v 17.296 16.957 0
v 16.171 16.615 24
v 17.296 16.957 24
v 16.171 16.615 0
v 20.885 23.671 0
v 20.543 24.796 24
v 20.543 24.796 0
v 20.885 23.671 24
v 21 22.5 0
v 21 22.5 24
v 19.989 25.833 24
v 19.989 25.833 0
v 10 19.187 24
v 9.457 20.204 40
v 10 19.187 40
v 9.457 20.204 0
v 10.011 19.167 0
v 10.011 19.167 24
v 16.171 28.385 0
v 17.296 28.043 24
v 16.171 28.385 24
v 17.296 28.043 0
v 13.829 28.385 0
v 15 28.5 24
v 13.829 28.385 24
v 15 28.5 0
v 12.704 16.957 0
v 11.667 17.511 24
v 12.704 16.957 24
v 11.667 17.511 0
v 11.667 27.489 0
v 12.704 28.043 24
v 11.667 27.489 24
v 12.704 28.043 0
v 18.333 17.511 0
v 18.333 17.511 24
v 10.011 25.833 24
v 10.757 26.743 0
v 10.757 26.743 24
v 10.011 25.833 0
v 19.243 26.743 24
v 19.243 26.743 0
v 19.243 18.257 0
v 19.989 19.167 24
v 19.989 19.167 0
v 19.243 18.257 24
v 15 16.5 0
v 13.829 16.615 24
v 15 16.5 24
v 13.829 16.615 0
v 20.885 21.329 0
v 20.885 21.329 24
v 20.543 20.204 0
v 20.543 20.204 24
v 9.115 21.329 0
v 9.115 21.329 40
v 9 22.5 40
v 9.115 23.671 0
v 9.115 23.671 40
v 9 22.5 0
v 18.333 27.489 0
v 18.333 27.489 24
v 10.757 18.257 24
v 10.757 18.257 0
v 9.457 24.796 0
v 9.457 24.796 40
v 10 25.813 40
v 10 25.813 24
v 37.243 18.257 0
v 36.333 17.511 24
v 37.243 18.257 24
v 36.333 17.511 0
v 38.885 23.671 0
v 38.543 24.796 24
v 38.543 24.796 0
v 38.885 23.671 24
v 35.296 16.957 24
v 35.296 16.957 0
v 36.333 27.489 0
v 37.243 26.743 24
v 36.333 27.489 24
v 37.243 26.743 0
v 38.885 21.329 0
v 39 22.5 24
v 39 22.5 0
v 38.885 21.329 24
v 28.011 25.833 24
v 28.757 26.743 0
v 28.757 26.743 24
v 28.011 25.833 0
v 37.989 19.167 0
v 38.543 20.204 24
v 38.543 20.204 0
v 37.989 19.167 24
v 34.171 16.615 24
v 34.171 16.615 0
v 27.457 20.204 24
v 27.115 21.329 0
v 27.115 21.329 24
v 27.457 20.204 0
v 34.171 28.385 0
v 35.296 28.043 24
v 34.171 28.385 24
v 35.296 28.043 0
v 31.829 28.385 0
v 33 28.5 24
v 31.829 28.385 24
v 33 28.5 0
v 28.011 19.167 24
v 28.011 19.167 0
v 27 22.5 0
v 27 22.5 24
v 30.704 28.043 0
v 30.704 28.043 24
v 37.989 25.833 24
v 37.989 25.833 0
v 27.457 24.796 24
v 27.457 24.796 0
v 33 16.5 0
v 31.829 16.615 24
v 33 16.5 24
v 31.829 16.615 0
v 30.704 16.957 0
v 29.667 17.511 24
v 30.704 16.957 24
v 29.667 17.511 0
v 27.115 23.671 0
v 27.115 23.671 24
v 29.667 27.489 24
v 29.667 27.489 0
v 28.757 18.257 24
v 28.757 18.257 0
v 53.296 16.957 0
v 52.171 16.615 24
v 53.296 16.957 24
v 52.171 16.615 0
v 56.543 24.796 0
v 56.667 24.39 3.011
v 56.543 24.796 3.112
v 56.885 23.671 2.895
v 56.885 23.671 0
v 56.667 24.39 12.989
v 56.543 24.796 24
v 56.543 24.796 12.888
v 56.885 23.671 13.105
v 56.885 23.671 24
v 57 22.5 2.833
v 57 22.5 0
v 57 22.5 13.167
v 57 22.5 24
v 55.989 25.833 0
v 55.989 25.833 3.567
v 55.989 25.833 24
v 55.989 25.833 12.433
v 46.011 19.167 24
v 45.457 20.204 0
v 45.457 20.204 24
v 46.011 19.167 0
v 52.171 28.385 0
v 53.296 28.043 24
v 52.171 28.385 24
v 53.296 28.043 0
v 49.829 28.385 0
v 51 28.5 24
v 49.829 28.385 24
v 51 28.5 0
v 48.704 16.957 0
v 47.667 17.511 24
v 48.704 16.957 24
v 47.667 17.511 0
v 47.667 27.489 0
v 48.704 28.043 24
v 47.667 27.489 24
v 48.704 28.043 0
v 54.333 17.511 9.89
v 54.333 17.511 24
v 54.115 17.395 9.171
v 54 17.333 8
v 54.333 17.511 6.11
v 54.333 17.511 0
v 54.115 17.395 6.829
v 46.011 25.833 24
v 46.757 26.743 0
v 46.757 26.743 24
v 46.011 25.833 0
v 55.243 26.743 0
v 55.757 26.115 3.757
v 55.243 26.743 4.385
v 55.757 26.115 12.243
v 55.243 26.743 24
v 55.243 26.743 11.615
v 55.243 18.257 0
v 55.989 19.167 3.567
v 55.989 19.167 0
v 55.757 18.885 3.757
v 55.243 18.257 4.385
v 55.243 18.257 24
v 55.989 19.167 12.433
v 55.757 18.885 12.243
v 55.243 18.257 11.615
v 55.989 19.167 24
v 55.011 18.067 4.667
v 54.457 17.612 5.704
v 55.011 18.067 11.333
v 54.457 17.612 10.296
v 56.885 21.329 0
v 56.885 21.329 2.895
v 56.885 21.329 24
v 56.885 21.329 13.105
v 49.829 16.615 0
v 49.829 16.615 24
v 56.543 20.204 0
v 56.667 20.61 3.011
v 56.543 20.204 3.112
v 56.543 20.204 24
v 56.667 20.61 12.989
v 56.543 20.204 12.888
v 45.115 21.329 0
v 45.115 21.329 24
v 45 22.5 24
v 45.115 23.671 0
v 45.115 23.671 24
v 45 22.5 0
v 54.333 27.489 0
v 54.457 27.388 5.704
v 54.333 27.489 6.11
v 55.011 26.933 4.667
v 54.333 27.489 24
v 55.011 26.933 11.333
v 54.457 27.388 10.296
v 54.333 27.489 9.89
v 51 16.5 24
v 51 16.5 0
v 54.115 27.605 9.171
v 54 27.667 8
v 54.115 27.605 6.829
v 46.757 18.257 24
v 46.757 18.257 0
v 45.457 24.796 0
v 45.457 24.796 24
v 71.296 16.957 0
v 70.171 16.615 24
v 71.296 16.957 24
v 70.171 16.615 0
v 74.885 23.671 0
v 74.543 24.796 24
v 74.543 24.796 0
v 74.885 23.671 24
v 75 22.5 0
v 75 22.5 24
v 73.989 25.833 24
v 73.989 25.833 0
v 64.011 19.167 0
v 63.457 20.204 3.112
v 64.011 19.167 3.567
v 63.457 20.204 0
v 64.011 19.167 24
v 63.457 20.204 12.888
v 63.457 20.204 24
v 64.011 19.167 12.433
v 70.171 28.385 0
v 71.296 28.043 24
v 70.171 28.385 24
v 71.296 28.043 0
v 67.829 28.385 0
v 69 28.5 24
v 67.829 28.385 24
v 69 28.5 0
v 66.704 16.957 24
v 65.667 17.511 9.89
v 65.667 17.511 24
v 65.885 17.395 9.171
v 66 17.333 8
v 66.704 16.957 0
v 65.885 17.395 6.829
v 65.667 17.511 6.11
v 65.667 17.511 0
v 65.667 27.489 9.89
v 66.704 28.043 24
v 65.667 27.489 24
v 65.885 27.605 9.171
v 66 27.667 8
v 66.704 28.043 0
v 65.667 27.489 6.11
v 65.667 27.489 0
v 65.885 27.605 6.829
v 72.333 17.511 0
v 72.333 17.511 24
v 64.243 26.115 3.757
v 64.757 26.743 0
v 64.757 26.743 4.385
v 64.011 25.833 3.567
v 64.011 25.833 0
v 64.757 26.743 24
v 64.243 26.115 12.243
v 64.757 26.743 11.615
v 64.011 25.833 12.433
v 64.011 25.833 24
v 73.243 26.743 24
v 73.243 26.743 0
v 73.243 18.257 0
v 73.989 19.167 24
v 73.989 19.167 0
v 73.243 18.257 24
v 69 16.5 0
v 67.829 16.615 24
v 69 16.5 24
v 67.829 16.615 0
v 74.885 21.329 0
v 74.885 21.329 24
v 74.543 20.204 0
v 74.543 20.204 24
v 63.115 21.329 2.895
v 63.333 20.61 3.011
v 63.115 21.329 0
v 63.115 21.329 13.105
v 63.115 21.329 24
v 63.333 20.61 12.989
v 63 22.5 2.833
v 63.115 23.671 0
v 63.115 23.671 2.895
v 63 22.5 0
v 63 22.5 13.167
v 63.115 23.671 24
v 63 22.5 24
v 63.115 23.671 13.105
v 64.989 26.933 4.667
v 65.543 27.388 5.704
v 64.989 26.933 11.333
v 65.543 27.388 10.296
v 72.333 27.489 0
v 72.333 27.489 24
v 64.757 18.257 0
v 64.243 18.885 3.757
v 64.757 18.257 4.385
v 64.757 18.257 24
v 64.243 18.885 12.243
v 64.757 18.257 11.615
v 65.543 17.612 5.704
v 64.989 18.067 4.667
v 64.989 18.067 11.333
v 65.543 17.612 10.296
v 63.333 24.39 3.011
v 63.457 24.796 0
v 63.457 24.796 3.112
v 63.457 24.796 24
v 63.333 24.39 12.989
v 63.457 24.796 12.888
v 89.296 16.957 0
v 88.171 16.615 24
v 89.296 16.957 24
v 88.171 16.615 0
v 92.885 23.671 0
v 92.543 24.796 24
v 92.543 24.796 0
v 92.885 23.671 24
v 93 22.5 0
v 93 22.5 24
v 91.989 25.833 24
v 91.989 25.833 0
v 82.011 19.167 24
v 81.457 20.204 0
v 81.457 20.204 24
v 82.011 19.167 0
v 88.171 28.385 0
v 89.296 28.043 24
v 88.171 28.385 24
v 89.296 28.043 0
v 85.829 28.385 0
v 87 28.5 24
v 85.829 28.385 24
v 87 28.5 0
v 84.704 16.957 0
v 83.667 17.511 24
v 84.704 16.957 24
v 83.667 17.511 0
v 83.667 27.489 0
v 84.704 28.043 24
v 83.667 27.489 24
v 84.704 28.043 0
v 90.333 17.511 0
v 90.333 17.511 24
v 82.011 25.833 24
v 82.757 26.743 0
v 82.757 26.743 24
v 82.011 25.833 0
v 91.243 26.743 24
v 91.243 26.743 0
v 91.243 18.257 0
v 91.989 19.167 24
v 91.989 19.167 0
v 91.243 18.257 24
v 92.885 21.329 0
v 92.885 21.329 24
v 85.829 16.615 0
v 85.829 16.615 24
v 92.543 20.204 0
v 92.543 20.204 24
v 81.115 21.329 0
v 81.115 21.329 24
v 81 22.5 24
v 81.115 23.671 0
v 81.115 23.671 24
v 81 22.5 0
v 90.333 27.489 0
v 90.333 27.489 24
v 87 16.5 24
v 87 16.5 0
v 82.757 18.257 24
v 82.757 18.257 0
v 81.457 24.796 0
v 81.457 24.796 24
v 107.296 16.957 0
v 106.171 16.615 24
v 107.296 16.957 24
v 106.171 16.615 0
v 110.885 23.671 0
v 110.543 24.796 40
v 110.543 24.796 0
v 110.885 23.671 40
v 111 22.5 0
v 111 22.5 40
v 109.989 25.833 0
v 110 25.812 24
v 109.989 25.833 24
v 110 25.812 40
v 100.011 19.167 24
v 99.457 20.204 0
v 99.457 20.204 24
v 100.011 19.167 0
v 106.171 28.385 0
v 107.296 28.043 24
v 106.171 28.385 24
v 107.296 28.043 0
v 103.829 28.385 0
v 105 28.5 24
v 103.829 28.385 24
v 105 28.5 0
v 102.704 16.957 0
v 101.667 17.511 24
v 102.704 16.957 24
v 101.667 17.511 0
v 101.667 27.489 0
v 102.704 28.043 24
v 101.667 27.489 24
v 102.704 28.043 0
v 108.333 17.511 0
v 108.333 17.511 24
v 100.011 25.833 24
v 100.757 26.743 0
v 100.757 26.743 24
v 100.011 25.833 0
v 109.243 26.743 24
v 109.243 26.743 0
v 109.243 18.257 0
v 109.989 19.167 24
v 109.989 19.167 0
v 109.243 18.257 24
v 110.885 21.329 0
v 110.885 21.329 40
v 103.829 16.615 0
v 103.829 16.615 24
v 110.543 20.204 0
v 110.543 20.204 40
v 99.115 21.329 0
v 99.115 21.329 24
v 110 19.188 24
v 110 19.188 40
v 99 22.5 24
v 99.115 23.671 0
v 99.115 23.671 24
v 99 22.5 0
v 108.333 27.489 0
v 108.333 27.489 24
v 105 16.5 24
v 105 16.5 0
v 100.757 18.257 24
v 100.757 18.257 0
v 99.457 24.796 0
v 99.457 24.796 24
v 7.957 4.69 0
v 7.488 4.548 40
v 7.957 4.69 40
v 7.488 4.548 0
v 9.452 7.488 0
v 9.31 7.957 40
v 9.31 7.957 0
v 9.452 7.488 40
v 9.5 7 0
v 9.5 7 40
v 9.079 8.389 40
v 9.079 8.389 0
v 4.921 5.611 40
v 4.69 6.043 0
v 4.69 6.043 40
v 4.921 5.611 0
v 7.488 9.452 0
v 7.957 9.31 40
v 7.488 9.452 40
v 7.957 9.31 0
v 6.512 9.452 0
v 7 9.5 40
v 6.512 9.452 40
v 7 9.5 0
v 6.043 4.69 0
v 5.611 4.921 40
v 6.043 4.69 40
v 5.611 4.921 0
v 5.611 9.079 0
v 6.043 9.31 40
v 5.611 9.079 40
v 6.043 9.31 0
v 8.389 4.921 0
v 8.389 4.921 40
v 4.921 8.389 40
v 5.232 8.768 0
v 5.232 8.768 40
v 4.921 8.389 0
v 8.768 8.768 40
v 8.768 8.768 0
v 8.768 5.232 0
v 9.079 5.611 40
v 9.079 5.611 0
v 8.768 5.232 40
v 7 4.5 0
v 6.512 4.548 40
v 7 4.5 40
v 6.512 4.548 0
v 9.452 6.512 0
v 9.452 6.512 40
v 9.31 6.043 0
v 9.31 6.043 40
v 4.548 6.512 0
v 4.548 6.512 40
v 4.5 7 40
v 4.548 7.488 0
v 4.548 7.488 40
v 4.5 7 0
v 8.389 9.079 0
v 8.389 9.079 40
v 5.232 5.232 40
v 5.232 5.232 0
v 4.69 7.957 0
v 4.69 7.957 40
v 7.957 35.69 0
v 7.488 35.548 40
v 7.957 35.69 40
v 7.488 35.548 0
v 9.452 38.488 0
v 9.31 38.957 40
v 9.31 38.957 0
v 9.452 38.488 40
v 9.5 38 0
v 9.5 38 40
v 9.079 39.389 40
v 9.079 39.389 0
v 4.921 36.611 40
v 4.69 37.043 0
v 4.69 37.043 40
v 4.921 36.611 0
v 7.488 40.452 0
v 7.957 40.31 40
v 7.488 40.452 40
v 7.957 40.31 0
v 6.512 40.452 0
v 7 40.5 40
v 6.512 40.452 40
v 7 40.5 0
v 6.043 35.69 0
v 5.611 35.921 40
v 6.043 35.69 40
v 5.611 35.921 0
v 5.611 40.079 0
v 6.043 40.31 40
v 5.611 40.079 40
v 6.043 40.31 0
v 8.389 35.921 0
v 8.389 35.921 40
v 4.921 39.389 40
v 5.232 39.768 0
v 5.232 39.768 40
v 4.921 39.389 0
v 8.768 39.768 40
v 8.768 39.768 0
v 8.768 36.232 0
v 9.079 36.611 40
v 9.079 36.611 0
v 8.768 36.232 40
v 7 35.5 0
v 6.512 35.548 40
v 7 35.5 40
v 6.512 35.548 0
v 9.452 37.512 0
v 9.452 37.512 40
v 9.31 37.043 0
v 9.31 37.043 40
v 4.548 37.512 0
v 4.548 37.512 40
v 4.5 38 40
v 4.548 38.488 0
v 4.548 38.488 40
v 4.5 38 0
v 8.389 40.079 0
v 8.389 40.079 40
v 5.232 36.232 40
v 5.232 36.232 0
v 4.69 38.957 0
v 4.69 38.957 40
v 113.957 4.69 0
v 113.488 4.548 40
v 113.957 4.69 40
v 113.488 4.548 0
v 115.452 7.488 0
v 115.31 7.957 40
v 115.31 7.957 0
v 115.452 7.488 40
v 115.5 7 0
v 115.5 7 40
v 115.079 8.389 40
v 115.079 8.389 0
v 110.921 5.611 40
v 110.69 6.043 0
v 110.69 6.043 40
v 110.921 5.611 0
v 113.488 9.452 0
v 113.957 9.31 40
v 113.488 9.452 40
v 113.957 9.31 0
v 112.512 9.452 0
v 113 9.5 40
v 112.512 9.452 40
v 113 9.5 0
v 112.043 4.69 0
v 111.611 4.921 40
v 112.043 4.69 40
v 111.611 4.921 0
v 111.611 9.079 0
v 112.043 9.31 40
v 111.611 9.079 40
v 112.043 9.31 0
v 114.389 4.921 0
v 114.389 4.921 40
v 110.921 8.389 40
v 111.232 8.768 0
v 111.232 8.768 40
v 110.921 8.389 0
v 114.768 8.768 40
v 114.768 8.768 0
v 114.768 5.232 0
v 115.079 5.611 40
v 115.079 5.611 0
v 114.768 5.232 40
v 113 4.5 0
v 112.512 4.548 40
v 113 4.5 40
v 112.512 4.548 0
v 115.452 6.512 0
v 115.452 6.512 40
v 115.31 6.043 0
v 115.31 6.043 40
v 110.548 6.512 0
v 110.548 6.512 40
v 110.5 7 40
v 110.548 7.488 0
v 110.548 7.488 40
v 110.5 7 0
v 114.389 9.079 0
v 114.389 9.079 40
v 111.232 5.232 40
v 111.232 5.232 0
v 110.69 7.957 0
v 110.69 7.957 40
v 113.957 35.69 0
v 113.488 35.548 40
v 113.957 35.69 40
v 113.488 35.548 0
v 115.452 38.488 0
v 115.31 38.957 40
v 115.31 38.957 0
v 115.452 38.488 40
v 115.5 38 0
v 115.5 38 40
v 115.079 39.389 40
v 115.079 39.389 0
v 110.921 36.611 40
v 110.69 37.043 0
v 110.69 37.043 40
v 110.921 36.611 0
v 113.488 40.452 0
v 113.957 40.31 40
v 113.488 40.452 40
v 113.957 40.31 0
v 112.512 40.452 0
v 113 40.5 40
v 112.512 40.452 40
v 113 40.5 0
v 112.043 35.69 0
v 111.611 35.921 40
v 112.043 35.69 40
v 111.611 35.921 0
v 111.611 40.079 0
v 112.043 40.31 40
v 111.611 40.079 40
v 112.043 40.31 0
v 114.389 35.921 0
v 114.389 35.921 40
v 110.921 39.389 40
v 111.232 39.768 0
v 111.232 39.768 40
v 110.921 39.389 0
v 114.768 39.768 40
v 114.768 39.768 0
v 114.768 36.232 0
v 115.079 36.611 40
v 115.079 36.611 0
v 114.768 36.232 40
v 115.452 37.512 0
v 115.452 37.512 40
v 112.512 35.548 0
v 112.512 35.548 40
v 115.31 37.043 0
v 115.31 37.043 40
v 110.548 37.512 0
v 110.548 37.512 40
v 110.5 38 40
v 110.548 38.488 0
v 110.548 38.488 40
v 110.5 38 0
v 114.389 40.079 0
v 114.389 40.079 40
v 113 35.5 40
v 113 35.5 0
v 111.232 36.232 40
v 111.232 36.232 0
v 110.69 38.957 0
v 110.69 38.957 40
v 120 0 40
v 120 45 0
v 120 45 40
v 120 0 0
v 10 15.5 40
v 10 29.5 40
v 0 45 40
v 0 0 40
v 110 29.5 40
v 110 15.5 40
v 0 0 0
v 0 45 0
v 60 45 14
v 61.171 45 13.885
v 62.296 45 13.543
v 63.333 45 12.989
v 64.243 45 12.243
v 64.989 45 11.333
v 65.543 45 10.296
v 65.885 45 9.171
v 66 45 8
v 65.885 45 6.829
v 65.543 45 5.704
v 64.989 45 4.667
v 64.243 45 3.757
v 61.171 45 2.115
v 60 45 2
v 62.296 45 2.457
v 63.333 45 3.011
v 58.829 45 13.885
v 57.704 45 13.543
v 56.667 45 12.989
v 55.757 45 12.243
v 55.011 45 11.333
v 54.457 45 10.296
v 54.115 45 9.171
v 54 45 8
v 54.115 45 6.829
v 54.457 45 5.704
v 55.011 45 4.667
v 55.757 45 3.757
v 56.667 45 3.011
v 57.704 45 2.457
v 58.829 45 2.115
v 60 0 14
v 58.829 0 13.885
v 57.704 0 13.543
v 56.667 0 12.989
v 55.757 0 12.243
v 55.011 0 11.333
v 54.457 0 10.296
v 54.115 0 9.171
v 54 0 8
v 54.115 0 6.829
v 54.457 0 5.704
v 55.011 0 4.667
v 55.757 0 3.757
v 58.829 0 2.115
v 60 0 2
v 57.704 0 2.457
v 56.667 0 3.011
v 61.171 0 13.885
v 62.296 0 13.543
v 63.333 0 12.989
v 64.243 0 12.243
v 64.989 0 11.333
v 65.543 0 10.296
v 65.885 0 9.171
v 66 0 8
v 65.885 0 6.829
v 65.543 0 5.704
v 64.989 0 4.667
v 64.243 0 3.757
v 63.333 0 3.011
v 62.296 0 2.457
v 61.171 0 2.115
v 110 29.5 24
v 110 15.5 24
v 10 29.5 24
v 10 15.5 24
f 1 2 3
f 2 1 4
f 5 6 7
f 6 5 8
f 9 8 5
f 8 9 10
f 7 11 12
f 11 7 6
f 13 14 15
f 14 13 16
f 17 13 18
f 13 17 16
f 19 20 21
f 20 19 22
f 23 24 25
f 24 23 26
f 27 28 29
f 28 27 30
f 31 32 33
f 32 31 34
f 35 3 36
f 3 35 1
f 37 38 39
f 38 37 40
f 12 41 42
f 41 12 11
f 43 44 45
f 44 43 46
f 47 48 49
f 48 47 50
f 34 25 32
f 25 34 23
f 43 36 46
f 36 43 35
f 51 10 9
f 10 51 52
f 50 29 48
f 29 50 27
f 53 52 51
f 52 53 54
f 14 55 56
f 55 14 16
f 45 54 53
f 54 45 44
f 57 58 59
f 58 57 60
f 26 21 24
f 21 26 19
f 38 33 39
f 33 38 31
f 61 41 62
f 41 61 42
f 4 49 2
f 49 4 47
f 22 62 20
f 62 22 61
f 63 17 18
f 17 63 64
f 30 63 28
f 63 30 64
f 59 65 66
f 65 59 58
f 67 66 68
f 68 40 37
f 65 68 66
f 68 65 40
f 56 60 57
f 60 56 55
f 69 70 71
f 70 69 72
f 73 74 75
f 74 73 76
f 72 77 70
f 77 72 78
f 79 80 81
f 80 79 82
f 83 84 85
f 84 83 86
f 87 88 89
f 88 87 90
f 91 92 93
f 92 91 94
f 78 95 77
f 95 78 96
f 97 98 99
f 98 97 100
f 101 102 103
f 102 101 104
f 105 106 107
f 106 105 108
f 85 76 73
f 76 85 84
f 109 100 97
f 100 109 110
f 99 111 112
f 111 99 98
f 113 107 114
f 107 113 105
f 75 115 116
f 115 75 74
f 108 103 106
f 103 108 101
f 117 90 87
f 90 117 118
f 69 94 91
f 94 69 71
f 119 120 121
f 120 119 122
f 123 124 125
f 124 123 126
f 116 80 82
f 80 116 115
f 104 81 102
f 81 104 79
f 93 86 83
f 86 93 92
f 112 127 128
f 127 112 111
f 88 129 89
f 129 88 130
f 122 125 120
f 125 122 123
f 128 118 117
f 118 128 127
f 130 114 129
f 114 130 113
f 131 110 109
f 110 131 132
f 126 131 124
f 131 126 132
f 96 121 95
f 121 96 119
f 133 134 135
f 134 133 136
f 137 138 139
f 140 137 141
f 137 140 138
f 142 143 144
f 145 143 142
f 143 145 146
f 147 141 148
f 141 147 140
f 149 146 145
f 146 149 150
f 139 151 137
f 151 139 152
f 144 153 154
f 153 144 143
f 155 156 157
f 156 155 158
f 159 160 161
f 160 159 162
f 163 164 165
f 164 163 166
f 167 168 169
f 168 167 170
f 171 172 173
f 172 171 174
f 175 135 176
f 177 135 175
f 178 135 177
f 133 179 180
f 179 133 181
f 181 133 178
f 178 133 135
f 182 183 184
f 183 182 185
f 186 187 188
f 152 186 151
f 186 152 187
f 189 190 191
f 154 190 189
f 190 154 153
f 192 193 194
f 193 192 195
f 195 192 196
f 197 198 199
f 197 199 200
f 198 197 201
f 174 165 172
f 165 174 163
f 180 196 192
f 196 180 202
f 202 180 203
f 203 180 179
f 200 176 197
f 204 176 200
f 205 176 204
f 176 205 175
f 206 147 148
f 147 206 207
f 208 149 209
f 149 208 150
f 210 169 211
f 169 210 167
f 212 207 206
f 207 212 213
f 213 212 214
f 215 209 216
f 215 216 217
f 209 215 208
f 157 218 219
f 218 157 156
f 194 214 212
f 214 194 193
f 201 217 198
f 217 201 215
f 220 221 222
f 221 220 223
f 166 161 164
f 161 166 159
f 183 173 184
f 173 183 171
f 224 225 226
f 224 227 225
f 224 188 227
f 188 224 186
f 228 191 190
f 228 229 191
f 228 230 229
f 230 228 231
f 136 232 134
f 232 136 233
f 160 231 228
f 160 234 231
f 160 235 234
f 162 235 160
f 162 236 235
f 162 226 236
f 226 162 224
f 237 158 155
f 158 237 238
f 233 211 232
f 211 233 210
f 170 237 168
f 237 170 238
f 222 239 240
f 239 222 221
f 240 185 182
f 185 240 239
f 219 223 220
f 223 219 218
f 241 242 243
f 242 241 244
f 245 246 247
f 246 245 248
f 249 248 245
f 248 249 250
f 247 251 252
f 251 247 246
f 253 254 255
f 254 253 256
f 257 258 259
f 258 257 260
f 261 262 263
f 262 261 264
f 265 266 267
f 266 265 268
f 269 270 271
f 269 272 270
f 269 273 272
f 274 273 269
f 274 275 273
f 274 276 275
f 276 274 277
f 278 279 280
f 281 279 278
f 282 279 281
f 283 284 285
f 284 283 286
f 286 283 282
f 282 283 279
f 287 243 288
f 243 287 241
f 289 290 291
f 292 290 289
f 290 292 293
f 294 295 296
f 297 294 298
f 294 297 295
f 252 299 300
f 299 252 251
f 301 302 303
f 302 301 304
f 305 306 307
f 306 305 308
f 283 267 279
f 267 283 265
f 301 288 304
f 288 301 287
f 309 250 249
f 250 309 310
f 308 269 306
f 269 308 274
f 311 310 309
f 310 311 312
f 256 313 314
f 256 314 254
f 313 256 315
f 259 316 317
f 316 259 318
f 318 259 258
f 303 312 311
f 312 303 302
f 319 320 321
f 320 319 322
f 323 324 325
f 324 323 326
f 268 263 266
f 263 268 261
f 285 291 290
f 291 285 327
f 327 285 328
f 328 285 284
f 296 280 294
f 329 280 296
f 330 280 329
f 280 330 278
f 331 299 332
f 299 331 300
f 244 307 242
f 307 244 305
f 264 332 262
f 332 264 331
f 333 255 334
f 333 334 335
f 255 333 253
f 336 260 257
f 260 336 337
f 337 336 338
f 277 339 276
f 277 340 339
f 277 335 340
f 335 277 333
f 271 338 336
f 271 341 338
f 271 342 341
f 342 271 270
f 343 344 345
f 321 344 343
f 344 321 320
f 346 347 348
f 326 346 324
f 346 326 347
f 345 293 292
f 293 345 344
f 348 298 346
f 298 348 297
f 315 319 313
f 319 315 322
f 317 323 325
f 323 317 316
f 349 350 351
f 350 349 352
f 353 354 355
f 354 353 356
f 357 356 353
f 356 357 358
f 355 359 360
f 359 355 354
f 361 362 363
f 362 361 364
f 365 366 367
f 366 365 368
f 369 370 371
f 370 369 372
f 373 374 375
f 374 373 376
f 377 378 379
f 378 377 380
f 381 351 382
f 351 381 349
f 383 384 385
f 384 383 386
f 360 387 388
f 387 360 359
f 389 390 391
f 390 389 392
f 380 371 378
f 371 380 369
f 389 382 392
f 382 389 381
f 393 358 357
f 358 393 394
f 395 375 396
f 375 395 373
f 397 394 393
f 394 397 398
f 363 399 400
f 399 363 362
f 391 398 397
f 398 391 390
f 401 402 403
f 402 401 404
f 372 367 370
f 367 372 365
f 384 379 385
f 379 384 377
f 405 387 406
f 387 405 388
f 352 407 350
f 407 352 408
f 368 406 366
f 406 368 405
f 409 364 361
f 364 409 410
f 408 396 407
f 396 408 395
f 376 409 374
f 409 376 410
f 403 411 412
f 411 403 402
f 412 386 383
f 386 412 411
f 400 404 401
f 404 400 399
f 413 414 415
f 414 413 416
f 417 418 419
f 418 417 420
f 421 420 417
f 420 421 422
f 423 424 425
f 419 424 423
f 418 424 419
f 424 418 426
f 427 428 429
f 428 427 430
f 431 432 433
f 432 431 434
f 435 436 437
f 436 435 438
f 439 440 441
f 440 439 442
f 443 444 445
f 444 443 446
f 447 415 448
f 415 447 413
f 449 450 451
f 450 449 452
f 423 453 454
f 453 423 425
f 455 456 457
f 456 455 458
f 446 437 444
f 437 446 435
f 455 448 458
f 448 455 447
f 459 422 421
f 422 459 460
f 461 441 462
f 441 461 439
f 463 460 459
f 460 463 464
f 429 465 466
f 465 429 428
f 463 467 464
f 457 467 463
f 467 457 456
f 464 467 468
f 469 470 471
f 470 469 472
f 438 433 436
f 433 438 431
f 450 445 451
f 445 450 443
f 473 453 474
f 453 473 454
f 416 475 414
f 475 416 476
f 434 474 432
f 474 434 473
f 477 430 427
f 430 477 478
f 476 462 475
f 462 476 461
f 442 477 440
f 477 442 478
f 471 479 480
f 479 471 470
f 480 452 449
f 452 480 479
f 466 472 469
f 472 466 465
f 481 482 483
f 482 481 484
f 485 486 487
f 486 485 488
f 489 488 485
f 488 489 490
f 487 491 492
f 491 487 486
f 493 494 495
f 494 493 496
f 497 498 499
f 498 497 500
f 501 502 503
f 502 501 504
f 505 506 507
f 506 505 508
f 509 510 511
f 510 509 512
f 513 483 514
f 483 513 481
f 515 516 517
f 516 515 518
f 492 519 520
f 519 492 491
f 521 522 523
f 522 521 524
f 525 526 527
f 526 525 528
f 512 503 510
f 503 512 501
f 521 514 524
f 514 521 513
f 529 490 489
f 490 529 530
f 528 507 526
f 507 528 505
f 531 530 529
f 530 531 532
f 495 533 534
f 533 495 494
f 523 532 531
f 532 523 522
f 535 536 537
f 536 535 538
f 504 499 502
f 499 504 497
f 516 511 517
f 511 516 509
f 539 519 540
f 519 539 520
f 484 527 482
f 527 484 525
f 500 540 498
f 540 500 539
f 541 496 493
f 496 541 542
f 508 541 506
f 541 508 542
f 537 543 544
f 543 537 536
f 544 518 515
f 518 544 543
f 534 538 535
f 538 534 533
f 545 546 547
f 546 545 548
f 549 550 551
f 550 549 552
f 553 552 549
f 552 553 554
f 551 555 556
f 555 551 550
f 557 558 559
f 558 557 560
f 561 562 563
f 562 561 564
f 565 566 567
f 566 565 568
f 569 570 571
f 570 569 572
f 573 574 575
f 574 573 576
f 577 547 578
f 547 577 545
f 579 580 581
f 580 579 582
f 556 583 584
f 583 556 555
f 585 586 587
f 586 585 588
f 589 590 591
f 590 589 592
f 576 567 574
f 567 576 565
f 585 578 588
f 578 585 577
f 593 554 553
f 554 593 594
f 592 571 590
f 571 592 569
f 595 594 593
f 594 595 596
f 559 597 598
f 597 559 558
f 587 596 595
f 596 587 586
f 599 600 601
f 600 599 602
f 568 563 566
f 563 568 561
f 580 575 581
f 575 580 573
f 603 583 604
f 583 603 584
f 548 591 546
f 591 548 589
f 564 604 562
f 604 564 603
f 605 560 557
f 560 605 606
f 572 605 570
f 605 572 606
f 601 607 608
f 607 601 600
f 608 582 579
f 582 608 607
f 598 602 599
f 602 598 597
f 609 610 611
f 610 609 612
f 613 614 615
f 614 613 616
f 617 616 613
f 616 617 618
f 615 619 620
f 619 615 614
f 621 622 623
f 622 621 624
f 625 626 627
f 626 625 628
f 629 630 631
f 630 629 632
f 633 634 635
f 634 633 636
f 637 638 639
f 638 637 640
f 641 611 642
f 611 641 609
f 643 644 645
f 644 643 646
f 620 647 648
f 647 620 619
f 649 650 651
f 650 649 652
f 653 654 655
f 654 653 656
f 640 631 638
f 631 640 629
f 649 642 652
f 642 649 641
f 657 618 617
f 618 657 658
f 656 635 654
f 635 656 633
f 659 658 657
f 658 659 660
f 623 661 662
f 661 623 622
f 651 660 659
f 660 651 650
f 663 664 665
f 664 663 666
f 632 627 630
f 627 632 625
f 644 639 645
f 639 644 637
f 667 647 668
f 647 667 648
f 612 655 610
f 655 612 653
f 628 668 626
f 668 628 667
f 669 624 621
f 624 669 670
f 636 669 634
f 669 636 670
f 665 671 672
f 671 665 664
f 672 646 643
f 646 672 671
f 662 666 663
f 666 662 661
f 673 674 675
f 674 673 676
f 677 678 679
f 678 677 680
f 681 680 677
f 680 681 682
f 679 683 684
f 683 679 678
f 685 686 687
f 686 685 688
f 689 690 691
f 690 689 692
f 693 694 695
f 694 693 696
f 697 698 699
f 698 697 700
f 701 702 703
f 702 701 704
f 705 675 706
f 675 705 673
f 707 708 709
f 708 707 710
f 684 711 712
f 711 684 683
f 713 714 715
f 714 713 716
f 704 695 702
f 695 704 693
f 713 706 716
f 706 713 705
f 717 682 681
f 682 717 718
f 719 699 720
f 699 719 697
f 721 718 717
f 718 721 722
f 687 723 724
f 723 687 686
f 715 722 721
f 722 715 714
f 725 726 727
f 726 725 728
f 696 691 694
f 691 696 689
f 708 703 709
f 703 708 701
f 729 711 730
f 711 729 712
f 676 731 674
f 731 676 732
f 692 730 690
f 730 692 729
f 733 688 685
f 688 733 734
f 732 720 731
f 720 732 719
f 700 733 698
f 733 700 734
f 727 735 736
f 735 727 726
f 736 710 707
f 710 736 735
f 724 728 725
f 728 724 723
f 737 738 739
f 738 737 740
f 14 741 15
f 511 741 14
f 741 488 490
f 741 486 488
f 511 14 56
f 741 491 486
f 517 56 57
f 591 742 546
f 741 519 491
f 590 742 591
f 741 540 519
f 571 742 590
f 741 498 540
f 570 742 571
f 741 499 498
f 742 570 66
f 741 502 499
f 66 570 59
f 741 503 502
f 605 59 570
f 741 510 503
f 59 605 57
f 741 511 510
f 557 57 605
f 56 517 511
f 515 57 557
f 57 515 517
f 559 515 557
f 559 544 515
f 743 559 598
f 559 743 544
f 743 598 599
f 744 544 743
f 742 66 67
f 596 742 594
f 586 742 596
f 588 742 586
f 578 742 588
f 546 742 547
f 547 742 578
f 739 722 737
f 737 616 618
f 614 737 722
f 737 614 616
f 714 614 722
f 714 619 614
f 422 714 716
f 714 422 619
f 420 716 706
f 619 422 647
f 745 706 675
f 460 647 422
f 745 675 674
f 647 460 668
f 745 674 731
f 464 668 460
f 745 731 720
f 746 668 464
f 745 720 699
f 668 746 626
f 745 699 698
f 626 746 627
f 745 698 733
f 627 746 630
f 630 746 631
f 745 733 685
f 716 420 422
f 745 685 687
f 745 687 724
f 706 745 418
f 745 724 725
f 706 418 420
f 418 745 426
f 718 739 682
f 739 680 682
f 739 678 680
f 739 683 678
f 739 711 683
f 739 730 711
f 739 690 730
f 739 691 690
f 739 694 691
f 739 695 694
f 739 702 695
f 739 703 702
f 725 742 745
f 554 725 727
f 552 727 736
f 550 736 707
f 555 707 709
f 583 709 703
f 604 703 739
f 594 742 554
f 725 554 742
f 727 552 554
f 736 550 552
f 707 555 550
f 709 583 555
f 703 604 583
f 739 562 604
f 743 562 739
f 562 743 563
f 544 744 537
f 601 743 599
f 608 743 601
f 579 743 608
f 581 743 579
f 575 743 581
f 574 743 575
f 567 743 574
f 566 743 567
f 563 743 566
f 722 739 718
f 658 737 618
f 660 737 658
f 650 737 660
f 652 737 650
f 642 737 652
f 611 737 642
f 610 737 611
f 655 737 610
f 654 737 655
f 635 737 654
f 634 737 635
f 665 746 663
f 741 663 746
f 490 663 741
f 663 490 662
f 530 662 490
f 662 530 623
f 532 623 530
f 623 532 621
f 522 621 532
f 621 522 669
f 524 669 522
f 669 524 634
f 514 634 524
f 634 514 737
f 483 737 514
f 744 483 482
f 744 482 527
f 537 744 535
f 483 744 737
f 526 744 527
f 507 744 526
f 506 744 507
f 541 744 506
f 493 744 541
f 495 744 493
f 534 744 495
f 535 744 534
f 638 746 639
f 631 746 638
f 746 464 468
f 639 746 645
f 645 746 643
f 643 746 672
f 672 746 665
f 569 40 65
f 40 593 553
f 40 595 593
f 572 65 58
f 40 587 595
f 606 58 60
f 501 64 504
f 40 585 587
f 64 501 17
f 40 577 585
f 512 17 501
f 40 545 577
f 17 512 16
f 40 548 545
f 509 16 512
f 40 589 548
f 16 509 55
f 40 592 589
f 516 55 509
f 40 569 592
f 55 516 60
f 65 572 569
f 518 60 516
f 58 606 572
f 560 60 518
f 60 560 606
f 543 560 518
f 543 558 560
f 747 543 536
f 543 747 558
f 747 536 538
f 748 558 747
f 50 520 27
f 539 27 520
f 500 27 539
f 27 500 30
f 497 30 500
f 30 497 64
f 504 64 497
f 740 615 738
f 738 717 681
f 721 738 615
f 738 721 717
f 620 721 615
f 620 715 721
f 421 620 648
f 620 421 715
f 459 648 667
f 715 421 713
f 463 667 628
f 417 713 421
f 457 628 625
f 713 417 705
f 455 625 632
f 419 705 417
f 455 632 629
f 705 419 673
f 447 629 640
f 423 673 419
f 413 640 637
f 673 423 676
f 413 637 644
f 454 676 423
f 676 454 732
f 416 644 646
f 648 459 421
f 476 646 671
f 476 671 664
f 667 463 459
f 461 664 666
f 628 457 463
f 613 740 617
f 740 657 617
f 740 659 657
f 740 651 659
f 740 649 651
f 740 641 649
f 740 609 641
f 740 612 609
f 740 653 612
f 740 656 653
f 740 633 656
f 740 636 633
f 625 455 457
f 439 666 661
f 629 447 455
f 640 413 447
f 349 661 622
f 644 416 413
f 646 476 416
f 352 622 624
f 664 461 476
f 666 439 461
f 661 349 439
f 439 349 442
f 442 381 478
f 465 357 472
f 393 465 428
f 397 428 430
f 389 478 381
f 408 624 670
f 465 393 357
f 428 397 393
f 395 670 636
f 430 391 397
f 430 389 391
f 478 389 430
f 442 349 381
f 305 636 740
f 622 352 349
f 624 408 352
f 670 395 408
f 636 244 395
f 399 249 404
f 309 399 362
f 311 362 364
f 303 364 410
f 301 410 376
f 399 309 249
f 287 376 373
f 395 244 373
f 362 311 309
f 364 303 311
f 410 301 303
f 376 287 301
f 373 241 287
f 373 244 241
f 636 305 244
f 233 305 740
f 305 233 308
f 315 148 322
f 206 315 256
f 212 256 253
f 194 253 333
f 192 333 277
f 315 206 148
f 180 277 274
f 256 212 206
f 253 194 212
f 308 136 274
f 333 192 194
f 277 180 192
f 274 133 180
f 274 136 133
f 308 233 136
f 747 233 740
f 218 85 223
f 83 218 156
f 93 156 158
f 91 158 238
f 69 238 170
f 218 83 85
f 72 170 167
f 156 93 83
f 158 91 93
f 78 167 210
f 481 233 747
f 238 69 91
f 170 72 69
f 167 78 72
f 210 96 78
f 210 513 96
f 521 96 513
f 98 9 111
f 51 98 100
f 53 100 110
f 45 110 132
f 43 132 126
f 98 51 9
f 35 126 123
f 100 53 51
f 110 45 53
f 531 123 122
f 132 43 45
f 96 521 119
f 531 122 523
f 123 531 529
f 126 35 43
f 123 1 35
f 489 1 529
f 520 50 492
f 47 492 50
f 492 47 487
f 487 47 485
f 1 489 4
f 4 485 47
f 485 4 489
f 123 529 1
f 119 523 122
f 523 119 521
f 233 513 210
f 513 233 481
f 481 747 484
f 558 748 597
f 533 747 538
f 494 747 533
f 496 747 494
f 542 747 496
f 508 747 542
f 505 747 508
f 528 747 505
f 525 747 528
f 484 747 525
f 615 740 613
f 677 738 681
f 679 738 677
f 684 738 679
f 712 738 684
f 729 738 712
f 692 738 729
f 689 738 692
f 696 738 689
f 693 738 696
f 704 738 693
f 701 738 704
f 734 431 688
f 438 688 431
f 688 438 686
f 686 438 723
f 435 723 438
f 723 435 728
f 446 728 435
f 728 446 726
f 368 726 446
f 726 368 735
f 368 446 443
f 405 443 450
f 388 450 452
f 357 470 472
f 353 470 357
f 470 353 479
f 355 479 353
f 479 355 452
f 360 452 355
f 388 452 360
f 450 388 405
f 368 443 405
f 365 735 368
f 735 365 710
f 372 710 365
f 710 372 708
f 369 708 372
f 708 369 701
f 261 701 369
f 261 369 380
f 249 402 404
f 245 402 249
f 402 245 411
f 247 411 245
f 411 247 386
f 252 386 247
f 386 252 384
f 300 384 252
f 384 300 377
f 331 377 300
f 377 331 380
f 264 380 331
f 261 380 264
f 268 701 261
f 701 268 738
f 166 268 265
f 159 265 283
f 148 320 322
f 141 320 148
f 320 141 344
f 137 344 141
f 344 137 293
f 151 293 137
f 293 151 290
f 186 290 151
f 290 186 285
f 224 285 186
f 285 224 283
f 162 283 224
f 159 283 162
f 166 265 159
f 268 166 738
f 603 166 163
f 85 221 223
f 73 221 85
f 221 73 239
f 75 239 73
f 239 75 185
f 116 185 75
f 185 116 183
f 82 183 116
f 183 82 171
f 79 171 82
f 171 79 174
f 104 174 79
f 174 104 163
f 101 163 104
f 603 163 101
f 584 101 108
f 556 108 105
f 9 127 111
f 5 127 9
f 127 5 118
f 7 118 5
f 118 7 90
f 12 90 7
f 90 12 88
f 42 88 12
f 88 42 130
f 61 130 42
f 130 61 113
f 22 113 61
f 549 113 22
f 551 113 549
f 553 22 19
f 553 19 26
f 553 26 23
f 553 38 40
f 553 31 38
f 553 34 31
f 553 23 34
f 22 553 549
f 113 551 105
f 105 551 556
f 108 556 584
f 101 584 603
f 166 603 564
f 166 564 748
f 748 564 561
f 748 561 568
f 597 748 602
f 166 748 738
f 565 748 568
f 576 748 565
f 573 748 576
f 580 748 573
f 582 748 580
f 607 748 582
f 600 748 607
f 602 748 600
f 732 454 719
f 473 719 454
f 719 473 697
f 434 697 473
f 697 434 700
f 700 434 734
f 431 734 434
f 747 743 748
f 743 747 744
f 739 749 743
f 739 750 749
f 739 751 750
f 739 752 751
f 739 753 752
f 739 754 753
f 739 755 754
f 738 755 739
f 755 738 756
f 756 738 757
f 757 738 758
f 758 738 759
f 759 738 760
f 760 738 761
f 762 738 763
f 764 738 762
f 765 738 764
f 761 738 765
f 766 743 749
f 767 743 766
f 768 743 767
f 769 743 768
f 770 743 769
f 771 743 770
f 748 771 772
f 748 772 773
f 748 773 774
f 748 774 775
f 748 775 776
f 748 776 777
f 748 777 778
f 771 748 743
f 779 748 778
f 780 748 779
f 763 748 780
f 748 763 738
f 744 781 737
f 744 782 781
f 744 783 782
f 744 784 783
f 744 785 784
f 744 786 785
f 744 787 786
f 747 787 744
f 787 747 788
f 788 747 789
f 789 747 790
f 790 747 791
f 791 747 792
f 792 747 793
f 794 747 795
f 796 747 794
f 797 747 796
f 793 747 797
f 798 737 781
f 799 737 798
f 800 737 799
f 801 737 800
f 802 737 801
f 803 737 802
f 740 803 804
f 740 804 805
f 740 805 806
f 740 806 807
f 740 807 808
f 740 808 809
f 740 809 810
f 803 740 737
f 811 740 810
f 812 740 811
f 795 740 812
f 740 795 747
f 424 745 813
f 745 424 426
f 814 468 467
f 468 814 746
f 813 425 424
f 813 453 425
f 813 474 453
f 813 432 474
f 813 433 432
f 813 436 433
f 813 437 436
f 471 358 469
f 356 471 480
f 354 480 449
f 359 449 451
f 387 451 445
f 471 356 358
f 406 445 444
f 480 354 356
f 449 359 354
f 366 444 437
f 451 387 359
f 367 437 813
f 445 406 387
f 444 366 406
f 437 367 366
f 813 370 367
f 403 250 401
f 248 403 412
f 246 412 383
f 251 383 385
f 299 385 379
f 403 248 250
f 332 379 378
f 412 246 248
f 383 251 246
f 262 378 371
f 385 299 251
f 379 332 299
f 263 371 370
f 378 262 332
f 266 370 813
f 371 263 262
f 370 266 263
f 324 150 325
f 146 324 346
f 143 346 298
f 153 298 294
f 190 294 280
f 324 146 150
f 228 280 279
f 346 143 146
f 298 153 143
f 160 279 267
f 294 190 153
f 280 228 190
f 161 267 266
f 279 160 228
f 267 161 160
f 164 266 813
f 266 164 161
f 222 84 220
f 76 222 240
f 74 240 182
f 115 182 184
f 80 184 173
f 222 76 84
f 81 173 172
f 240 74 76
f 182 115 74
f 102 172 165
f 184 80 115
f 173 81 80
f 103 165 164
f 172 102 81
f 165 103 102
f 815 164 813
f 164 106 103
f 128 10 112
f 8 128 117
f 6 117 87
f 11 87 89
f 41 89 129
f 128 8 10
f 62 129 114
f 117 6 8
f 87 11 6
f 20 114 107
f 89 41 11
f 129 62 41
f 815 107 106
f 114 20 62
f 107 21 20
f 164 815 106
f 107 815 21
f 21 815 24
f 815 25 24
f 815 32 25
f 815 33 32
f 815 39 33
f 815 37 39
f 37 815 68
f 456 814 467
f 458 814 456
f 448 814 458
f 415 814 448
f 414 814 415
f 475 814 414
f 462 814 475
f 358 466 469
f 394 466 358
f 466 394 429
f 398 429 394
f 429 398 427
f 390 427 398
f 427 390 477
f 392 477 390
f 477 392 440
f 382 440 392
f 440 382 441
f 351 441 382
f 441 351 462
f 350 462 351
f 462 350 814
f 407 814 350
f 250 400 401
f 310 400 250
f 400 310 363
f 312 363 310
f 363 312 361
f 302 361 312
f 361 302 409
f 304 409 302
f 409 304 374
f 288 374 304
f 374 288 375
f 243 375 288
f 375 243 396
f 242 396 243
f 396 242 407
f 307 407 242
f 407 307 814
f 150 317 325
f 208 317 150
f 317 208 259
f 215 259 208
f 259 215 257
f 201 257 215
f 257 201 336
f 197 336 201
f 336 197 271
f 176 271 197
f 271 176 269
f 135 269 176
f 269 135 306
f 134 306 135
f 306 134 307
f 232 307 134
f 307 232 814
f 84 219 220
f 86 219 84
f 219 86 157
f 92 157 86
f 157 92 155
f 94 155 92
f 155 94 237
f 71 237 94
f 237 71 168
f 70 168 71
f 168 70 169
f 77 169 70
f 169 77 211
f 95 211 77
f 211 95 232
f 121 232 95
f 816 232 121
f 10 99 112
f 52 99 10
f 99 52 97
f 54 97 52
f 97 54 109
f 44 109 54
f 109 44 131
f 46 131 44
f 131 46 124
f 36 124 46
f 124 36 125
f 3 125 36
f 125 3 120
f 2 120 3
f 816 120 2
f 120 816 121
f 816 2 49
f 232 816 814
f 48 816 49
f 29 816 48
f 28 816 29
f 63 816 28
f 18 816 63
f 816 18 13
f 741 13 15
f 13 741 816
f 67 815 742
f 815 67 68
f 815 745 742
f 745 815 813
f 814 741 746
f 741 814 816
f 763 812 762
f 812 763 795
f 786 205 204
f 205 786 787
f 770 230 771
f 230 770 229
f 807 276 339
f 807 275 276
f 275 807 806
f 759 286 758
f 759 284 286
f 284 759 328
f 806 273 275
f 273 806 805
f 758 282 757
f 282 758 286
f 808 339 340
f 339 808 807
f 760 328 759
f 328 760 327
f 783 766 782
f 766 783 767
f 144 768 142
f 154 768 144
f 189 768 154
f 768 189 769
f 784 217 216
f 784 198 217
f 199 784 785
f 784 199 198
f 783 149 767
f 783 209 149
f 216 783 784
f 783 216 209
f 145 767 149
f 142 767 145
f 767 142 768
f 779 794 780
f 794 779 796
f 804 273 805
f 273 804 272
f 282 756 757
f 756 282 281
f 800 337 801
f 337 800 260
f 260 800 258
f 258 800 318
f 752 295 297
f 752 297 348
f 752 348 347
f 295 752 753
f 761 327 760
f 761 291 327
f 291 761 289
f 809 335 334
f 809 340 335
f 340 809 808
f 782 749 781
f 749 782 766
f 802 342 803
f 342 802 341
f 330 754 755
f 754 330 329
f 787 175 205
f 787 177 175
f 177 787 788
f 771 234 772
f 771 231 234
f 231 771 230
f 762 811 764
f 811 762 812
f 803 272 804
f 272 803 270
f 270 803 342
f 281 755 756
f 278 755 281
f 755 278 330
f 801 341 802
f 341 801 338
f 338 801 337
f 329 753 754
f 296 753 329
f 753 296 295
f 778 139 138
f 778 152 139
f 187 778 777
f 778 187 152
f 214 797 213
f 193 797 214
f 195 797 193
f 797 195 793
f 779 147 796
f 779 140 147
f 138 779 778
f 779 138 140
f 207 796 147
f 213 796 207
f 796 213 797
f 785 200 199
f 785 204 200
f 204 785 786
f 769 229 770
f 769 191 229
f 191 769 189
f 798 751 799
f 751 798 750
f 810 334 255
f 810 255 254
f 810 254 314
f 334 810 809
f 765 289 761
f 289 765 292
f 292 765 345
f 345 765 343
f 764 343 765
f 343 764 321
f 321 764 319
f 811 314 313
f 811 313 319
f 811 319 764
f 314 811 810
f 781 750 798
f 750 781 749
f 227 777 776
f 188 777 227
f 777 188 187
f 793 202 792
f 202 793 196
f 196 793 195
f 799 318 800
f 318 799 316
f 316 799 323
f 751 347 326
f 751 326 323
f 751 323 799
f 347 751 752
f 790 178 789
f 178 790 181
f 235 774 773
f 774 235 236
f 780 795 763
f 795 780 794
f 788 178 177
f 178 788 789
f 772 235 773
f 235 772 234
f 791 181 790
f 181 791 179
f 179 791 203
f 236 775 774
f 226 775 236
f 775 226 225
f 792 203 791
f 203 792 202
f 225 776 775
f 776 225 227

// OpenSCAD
$fn = 32;

// ----------------------------------------------------------------------
// Manifold block: side_outlet manifold
// ----------------------------------------------------------------------

// --- parameters (mm) ---
block_l = 120;            // block length, X
block_w = 45;             // block width, Y
block_h = 40;             // block height, Z
port_d = 12;              // port bore diameter
port_pitch = 18;          // port pitch along X
gallery_d = 14;           // top gallery width, Y
gallery_depth = 16;       // gallery pocket depth
wall_p = 10;              // gallery end wall thickness, X
mnt_d = 5;                // mounting hole diameter
mnt_in = 7;               // mounting hole inset from the edges
out_d = 12;               // outlet bore diameter
out_z = 8;                // outlet axis height

n_ports = 6;  // ports in the row
port_x0 = (block_l - (n_ports - 1) * port_pitch) / 2;  // first port X

difference() {
  cube([block_l, block_w, block_h]);
  for (i = [0 : n_ports - 1])
    translate([port_x0 + i * port_pitch, block_w / 2, -1])
      cylinder(h = block_h + 2, d = port_d);
  translate([wall_p, block_w / 2 - gallery_d / 2, block_h - gallery_depth])
    cube([block_l - 2 * wall_p, gallery_d, gallery_depth + 1]);
  for (cx = [mnt_in, block_l - mnt_in])
    for (cy = [mnt_in, block_w - mnt_in])
      translate([cx, cy, -1]) cylinder(h = block_h + 2, d = mnt_d);
  translate([block_l / 2, -1, out_z]) rotate([-90, 0, 0])
    cylinder(h = block_w + 2, d = out_d);
}
